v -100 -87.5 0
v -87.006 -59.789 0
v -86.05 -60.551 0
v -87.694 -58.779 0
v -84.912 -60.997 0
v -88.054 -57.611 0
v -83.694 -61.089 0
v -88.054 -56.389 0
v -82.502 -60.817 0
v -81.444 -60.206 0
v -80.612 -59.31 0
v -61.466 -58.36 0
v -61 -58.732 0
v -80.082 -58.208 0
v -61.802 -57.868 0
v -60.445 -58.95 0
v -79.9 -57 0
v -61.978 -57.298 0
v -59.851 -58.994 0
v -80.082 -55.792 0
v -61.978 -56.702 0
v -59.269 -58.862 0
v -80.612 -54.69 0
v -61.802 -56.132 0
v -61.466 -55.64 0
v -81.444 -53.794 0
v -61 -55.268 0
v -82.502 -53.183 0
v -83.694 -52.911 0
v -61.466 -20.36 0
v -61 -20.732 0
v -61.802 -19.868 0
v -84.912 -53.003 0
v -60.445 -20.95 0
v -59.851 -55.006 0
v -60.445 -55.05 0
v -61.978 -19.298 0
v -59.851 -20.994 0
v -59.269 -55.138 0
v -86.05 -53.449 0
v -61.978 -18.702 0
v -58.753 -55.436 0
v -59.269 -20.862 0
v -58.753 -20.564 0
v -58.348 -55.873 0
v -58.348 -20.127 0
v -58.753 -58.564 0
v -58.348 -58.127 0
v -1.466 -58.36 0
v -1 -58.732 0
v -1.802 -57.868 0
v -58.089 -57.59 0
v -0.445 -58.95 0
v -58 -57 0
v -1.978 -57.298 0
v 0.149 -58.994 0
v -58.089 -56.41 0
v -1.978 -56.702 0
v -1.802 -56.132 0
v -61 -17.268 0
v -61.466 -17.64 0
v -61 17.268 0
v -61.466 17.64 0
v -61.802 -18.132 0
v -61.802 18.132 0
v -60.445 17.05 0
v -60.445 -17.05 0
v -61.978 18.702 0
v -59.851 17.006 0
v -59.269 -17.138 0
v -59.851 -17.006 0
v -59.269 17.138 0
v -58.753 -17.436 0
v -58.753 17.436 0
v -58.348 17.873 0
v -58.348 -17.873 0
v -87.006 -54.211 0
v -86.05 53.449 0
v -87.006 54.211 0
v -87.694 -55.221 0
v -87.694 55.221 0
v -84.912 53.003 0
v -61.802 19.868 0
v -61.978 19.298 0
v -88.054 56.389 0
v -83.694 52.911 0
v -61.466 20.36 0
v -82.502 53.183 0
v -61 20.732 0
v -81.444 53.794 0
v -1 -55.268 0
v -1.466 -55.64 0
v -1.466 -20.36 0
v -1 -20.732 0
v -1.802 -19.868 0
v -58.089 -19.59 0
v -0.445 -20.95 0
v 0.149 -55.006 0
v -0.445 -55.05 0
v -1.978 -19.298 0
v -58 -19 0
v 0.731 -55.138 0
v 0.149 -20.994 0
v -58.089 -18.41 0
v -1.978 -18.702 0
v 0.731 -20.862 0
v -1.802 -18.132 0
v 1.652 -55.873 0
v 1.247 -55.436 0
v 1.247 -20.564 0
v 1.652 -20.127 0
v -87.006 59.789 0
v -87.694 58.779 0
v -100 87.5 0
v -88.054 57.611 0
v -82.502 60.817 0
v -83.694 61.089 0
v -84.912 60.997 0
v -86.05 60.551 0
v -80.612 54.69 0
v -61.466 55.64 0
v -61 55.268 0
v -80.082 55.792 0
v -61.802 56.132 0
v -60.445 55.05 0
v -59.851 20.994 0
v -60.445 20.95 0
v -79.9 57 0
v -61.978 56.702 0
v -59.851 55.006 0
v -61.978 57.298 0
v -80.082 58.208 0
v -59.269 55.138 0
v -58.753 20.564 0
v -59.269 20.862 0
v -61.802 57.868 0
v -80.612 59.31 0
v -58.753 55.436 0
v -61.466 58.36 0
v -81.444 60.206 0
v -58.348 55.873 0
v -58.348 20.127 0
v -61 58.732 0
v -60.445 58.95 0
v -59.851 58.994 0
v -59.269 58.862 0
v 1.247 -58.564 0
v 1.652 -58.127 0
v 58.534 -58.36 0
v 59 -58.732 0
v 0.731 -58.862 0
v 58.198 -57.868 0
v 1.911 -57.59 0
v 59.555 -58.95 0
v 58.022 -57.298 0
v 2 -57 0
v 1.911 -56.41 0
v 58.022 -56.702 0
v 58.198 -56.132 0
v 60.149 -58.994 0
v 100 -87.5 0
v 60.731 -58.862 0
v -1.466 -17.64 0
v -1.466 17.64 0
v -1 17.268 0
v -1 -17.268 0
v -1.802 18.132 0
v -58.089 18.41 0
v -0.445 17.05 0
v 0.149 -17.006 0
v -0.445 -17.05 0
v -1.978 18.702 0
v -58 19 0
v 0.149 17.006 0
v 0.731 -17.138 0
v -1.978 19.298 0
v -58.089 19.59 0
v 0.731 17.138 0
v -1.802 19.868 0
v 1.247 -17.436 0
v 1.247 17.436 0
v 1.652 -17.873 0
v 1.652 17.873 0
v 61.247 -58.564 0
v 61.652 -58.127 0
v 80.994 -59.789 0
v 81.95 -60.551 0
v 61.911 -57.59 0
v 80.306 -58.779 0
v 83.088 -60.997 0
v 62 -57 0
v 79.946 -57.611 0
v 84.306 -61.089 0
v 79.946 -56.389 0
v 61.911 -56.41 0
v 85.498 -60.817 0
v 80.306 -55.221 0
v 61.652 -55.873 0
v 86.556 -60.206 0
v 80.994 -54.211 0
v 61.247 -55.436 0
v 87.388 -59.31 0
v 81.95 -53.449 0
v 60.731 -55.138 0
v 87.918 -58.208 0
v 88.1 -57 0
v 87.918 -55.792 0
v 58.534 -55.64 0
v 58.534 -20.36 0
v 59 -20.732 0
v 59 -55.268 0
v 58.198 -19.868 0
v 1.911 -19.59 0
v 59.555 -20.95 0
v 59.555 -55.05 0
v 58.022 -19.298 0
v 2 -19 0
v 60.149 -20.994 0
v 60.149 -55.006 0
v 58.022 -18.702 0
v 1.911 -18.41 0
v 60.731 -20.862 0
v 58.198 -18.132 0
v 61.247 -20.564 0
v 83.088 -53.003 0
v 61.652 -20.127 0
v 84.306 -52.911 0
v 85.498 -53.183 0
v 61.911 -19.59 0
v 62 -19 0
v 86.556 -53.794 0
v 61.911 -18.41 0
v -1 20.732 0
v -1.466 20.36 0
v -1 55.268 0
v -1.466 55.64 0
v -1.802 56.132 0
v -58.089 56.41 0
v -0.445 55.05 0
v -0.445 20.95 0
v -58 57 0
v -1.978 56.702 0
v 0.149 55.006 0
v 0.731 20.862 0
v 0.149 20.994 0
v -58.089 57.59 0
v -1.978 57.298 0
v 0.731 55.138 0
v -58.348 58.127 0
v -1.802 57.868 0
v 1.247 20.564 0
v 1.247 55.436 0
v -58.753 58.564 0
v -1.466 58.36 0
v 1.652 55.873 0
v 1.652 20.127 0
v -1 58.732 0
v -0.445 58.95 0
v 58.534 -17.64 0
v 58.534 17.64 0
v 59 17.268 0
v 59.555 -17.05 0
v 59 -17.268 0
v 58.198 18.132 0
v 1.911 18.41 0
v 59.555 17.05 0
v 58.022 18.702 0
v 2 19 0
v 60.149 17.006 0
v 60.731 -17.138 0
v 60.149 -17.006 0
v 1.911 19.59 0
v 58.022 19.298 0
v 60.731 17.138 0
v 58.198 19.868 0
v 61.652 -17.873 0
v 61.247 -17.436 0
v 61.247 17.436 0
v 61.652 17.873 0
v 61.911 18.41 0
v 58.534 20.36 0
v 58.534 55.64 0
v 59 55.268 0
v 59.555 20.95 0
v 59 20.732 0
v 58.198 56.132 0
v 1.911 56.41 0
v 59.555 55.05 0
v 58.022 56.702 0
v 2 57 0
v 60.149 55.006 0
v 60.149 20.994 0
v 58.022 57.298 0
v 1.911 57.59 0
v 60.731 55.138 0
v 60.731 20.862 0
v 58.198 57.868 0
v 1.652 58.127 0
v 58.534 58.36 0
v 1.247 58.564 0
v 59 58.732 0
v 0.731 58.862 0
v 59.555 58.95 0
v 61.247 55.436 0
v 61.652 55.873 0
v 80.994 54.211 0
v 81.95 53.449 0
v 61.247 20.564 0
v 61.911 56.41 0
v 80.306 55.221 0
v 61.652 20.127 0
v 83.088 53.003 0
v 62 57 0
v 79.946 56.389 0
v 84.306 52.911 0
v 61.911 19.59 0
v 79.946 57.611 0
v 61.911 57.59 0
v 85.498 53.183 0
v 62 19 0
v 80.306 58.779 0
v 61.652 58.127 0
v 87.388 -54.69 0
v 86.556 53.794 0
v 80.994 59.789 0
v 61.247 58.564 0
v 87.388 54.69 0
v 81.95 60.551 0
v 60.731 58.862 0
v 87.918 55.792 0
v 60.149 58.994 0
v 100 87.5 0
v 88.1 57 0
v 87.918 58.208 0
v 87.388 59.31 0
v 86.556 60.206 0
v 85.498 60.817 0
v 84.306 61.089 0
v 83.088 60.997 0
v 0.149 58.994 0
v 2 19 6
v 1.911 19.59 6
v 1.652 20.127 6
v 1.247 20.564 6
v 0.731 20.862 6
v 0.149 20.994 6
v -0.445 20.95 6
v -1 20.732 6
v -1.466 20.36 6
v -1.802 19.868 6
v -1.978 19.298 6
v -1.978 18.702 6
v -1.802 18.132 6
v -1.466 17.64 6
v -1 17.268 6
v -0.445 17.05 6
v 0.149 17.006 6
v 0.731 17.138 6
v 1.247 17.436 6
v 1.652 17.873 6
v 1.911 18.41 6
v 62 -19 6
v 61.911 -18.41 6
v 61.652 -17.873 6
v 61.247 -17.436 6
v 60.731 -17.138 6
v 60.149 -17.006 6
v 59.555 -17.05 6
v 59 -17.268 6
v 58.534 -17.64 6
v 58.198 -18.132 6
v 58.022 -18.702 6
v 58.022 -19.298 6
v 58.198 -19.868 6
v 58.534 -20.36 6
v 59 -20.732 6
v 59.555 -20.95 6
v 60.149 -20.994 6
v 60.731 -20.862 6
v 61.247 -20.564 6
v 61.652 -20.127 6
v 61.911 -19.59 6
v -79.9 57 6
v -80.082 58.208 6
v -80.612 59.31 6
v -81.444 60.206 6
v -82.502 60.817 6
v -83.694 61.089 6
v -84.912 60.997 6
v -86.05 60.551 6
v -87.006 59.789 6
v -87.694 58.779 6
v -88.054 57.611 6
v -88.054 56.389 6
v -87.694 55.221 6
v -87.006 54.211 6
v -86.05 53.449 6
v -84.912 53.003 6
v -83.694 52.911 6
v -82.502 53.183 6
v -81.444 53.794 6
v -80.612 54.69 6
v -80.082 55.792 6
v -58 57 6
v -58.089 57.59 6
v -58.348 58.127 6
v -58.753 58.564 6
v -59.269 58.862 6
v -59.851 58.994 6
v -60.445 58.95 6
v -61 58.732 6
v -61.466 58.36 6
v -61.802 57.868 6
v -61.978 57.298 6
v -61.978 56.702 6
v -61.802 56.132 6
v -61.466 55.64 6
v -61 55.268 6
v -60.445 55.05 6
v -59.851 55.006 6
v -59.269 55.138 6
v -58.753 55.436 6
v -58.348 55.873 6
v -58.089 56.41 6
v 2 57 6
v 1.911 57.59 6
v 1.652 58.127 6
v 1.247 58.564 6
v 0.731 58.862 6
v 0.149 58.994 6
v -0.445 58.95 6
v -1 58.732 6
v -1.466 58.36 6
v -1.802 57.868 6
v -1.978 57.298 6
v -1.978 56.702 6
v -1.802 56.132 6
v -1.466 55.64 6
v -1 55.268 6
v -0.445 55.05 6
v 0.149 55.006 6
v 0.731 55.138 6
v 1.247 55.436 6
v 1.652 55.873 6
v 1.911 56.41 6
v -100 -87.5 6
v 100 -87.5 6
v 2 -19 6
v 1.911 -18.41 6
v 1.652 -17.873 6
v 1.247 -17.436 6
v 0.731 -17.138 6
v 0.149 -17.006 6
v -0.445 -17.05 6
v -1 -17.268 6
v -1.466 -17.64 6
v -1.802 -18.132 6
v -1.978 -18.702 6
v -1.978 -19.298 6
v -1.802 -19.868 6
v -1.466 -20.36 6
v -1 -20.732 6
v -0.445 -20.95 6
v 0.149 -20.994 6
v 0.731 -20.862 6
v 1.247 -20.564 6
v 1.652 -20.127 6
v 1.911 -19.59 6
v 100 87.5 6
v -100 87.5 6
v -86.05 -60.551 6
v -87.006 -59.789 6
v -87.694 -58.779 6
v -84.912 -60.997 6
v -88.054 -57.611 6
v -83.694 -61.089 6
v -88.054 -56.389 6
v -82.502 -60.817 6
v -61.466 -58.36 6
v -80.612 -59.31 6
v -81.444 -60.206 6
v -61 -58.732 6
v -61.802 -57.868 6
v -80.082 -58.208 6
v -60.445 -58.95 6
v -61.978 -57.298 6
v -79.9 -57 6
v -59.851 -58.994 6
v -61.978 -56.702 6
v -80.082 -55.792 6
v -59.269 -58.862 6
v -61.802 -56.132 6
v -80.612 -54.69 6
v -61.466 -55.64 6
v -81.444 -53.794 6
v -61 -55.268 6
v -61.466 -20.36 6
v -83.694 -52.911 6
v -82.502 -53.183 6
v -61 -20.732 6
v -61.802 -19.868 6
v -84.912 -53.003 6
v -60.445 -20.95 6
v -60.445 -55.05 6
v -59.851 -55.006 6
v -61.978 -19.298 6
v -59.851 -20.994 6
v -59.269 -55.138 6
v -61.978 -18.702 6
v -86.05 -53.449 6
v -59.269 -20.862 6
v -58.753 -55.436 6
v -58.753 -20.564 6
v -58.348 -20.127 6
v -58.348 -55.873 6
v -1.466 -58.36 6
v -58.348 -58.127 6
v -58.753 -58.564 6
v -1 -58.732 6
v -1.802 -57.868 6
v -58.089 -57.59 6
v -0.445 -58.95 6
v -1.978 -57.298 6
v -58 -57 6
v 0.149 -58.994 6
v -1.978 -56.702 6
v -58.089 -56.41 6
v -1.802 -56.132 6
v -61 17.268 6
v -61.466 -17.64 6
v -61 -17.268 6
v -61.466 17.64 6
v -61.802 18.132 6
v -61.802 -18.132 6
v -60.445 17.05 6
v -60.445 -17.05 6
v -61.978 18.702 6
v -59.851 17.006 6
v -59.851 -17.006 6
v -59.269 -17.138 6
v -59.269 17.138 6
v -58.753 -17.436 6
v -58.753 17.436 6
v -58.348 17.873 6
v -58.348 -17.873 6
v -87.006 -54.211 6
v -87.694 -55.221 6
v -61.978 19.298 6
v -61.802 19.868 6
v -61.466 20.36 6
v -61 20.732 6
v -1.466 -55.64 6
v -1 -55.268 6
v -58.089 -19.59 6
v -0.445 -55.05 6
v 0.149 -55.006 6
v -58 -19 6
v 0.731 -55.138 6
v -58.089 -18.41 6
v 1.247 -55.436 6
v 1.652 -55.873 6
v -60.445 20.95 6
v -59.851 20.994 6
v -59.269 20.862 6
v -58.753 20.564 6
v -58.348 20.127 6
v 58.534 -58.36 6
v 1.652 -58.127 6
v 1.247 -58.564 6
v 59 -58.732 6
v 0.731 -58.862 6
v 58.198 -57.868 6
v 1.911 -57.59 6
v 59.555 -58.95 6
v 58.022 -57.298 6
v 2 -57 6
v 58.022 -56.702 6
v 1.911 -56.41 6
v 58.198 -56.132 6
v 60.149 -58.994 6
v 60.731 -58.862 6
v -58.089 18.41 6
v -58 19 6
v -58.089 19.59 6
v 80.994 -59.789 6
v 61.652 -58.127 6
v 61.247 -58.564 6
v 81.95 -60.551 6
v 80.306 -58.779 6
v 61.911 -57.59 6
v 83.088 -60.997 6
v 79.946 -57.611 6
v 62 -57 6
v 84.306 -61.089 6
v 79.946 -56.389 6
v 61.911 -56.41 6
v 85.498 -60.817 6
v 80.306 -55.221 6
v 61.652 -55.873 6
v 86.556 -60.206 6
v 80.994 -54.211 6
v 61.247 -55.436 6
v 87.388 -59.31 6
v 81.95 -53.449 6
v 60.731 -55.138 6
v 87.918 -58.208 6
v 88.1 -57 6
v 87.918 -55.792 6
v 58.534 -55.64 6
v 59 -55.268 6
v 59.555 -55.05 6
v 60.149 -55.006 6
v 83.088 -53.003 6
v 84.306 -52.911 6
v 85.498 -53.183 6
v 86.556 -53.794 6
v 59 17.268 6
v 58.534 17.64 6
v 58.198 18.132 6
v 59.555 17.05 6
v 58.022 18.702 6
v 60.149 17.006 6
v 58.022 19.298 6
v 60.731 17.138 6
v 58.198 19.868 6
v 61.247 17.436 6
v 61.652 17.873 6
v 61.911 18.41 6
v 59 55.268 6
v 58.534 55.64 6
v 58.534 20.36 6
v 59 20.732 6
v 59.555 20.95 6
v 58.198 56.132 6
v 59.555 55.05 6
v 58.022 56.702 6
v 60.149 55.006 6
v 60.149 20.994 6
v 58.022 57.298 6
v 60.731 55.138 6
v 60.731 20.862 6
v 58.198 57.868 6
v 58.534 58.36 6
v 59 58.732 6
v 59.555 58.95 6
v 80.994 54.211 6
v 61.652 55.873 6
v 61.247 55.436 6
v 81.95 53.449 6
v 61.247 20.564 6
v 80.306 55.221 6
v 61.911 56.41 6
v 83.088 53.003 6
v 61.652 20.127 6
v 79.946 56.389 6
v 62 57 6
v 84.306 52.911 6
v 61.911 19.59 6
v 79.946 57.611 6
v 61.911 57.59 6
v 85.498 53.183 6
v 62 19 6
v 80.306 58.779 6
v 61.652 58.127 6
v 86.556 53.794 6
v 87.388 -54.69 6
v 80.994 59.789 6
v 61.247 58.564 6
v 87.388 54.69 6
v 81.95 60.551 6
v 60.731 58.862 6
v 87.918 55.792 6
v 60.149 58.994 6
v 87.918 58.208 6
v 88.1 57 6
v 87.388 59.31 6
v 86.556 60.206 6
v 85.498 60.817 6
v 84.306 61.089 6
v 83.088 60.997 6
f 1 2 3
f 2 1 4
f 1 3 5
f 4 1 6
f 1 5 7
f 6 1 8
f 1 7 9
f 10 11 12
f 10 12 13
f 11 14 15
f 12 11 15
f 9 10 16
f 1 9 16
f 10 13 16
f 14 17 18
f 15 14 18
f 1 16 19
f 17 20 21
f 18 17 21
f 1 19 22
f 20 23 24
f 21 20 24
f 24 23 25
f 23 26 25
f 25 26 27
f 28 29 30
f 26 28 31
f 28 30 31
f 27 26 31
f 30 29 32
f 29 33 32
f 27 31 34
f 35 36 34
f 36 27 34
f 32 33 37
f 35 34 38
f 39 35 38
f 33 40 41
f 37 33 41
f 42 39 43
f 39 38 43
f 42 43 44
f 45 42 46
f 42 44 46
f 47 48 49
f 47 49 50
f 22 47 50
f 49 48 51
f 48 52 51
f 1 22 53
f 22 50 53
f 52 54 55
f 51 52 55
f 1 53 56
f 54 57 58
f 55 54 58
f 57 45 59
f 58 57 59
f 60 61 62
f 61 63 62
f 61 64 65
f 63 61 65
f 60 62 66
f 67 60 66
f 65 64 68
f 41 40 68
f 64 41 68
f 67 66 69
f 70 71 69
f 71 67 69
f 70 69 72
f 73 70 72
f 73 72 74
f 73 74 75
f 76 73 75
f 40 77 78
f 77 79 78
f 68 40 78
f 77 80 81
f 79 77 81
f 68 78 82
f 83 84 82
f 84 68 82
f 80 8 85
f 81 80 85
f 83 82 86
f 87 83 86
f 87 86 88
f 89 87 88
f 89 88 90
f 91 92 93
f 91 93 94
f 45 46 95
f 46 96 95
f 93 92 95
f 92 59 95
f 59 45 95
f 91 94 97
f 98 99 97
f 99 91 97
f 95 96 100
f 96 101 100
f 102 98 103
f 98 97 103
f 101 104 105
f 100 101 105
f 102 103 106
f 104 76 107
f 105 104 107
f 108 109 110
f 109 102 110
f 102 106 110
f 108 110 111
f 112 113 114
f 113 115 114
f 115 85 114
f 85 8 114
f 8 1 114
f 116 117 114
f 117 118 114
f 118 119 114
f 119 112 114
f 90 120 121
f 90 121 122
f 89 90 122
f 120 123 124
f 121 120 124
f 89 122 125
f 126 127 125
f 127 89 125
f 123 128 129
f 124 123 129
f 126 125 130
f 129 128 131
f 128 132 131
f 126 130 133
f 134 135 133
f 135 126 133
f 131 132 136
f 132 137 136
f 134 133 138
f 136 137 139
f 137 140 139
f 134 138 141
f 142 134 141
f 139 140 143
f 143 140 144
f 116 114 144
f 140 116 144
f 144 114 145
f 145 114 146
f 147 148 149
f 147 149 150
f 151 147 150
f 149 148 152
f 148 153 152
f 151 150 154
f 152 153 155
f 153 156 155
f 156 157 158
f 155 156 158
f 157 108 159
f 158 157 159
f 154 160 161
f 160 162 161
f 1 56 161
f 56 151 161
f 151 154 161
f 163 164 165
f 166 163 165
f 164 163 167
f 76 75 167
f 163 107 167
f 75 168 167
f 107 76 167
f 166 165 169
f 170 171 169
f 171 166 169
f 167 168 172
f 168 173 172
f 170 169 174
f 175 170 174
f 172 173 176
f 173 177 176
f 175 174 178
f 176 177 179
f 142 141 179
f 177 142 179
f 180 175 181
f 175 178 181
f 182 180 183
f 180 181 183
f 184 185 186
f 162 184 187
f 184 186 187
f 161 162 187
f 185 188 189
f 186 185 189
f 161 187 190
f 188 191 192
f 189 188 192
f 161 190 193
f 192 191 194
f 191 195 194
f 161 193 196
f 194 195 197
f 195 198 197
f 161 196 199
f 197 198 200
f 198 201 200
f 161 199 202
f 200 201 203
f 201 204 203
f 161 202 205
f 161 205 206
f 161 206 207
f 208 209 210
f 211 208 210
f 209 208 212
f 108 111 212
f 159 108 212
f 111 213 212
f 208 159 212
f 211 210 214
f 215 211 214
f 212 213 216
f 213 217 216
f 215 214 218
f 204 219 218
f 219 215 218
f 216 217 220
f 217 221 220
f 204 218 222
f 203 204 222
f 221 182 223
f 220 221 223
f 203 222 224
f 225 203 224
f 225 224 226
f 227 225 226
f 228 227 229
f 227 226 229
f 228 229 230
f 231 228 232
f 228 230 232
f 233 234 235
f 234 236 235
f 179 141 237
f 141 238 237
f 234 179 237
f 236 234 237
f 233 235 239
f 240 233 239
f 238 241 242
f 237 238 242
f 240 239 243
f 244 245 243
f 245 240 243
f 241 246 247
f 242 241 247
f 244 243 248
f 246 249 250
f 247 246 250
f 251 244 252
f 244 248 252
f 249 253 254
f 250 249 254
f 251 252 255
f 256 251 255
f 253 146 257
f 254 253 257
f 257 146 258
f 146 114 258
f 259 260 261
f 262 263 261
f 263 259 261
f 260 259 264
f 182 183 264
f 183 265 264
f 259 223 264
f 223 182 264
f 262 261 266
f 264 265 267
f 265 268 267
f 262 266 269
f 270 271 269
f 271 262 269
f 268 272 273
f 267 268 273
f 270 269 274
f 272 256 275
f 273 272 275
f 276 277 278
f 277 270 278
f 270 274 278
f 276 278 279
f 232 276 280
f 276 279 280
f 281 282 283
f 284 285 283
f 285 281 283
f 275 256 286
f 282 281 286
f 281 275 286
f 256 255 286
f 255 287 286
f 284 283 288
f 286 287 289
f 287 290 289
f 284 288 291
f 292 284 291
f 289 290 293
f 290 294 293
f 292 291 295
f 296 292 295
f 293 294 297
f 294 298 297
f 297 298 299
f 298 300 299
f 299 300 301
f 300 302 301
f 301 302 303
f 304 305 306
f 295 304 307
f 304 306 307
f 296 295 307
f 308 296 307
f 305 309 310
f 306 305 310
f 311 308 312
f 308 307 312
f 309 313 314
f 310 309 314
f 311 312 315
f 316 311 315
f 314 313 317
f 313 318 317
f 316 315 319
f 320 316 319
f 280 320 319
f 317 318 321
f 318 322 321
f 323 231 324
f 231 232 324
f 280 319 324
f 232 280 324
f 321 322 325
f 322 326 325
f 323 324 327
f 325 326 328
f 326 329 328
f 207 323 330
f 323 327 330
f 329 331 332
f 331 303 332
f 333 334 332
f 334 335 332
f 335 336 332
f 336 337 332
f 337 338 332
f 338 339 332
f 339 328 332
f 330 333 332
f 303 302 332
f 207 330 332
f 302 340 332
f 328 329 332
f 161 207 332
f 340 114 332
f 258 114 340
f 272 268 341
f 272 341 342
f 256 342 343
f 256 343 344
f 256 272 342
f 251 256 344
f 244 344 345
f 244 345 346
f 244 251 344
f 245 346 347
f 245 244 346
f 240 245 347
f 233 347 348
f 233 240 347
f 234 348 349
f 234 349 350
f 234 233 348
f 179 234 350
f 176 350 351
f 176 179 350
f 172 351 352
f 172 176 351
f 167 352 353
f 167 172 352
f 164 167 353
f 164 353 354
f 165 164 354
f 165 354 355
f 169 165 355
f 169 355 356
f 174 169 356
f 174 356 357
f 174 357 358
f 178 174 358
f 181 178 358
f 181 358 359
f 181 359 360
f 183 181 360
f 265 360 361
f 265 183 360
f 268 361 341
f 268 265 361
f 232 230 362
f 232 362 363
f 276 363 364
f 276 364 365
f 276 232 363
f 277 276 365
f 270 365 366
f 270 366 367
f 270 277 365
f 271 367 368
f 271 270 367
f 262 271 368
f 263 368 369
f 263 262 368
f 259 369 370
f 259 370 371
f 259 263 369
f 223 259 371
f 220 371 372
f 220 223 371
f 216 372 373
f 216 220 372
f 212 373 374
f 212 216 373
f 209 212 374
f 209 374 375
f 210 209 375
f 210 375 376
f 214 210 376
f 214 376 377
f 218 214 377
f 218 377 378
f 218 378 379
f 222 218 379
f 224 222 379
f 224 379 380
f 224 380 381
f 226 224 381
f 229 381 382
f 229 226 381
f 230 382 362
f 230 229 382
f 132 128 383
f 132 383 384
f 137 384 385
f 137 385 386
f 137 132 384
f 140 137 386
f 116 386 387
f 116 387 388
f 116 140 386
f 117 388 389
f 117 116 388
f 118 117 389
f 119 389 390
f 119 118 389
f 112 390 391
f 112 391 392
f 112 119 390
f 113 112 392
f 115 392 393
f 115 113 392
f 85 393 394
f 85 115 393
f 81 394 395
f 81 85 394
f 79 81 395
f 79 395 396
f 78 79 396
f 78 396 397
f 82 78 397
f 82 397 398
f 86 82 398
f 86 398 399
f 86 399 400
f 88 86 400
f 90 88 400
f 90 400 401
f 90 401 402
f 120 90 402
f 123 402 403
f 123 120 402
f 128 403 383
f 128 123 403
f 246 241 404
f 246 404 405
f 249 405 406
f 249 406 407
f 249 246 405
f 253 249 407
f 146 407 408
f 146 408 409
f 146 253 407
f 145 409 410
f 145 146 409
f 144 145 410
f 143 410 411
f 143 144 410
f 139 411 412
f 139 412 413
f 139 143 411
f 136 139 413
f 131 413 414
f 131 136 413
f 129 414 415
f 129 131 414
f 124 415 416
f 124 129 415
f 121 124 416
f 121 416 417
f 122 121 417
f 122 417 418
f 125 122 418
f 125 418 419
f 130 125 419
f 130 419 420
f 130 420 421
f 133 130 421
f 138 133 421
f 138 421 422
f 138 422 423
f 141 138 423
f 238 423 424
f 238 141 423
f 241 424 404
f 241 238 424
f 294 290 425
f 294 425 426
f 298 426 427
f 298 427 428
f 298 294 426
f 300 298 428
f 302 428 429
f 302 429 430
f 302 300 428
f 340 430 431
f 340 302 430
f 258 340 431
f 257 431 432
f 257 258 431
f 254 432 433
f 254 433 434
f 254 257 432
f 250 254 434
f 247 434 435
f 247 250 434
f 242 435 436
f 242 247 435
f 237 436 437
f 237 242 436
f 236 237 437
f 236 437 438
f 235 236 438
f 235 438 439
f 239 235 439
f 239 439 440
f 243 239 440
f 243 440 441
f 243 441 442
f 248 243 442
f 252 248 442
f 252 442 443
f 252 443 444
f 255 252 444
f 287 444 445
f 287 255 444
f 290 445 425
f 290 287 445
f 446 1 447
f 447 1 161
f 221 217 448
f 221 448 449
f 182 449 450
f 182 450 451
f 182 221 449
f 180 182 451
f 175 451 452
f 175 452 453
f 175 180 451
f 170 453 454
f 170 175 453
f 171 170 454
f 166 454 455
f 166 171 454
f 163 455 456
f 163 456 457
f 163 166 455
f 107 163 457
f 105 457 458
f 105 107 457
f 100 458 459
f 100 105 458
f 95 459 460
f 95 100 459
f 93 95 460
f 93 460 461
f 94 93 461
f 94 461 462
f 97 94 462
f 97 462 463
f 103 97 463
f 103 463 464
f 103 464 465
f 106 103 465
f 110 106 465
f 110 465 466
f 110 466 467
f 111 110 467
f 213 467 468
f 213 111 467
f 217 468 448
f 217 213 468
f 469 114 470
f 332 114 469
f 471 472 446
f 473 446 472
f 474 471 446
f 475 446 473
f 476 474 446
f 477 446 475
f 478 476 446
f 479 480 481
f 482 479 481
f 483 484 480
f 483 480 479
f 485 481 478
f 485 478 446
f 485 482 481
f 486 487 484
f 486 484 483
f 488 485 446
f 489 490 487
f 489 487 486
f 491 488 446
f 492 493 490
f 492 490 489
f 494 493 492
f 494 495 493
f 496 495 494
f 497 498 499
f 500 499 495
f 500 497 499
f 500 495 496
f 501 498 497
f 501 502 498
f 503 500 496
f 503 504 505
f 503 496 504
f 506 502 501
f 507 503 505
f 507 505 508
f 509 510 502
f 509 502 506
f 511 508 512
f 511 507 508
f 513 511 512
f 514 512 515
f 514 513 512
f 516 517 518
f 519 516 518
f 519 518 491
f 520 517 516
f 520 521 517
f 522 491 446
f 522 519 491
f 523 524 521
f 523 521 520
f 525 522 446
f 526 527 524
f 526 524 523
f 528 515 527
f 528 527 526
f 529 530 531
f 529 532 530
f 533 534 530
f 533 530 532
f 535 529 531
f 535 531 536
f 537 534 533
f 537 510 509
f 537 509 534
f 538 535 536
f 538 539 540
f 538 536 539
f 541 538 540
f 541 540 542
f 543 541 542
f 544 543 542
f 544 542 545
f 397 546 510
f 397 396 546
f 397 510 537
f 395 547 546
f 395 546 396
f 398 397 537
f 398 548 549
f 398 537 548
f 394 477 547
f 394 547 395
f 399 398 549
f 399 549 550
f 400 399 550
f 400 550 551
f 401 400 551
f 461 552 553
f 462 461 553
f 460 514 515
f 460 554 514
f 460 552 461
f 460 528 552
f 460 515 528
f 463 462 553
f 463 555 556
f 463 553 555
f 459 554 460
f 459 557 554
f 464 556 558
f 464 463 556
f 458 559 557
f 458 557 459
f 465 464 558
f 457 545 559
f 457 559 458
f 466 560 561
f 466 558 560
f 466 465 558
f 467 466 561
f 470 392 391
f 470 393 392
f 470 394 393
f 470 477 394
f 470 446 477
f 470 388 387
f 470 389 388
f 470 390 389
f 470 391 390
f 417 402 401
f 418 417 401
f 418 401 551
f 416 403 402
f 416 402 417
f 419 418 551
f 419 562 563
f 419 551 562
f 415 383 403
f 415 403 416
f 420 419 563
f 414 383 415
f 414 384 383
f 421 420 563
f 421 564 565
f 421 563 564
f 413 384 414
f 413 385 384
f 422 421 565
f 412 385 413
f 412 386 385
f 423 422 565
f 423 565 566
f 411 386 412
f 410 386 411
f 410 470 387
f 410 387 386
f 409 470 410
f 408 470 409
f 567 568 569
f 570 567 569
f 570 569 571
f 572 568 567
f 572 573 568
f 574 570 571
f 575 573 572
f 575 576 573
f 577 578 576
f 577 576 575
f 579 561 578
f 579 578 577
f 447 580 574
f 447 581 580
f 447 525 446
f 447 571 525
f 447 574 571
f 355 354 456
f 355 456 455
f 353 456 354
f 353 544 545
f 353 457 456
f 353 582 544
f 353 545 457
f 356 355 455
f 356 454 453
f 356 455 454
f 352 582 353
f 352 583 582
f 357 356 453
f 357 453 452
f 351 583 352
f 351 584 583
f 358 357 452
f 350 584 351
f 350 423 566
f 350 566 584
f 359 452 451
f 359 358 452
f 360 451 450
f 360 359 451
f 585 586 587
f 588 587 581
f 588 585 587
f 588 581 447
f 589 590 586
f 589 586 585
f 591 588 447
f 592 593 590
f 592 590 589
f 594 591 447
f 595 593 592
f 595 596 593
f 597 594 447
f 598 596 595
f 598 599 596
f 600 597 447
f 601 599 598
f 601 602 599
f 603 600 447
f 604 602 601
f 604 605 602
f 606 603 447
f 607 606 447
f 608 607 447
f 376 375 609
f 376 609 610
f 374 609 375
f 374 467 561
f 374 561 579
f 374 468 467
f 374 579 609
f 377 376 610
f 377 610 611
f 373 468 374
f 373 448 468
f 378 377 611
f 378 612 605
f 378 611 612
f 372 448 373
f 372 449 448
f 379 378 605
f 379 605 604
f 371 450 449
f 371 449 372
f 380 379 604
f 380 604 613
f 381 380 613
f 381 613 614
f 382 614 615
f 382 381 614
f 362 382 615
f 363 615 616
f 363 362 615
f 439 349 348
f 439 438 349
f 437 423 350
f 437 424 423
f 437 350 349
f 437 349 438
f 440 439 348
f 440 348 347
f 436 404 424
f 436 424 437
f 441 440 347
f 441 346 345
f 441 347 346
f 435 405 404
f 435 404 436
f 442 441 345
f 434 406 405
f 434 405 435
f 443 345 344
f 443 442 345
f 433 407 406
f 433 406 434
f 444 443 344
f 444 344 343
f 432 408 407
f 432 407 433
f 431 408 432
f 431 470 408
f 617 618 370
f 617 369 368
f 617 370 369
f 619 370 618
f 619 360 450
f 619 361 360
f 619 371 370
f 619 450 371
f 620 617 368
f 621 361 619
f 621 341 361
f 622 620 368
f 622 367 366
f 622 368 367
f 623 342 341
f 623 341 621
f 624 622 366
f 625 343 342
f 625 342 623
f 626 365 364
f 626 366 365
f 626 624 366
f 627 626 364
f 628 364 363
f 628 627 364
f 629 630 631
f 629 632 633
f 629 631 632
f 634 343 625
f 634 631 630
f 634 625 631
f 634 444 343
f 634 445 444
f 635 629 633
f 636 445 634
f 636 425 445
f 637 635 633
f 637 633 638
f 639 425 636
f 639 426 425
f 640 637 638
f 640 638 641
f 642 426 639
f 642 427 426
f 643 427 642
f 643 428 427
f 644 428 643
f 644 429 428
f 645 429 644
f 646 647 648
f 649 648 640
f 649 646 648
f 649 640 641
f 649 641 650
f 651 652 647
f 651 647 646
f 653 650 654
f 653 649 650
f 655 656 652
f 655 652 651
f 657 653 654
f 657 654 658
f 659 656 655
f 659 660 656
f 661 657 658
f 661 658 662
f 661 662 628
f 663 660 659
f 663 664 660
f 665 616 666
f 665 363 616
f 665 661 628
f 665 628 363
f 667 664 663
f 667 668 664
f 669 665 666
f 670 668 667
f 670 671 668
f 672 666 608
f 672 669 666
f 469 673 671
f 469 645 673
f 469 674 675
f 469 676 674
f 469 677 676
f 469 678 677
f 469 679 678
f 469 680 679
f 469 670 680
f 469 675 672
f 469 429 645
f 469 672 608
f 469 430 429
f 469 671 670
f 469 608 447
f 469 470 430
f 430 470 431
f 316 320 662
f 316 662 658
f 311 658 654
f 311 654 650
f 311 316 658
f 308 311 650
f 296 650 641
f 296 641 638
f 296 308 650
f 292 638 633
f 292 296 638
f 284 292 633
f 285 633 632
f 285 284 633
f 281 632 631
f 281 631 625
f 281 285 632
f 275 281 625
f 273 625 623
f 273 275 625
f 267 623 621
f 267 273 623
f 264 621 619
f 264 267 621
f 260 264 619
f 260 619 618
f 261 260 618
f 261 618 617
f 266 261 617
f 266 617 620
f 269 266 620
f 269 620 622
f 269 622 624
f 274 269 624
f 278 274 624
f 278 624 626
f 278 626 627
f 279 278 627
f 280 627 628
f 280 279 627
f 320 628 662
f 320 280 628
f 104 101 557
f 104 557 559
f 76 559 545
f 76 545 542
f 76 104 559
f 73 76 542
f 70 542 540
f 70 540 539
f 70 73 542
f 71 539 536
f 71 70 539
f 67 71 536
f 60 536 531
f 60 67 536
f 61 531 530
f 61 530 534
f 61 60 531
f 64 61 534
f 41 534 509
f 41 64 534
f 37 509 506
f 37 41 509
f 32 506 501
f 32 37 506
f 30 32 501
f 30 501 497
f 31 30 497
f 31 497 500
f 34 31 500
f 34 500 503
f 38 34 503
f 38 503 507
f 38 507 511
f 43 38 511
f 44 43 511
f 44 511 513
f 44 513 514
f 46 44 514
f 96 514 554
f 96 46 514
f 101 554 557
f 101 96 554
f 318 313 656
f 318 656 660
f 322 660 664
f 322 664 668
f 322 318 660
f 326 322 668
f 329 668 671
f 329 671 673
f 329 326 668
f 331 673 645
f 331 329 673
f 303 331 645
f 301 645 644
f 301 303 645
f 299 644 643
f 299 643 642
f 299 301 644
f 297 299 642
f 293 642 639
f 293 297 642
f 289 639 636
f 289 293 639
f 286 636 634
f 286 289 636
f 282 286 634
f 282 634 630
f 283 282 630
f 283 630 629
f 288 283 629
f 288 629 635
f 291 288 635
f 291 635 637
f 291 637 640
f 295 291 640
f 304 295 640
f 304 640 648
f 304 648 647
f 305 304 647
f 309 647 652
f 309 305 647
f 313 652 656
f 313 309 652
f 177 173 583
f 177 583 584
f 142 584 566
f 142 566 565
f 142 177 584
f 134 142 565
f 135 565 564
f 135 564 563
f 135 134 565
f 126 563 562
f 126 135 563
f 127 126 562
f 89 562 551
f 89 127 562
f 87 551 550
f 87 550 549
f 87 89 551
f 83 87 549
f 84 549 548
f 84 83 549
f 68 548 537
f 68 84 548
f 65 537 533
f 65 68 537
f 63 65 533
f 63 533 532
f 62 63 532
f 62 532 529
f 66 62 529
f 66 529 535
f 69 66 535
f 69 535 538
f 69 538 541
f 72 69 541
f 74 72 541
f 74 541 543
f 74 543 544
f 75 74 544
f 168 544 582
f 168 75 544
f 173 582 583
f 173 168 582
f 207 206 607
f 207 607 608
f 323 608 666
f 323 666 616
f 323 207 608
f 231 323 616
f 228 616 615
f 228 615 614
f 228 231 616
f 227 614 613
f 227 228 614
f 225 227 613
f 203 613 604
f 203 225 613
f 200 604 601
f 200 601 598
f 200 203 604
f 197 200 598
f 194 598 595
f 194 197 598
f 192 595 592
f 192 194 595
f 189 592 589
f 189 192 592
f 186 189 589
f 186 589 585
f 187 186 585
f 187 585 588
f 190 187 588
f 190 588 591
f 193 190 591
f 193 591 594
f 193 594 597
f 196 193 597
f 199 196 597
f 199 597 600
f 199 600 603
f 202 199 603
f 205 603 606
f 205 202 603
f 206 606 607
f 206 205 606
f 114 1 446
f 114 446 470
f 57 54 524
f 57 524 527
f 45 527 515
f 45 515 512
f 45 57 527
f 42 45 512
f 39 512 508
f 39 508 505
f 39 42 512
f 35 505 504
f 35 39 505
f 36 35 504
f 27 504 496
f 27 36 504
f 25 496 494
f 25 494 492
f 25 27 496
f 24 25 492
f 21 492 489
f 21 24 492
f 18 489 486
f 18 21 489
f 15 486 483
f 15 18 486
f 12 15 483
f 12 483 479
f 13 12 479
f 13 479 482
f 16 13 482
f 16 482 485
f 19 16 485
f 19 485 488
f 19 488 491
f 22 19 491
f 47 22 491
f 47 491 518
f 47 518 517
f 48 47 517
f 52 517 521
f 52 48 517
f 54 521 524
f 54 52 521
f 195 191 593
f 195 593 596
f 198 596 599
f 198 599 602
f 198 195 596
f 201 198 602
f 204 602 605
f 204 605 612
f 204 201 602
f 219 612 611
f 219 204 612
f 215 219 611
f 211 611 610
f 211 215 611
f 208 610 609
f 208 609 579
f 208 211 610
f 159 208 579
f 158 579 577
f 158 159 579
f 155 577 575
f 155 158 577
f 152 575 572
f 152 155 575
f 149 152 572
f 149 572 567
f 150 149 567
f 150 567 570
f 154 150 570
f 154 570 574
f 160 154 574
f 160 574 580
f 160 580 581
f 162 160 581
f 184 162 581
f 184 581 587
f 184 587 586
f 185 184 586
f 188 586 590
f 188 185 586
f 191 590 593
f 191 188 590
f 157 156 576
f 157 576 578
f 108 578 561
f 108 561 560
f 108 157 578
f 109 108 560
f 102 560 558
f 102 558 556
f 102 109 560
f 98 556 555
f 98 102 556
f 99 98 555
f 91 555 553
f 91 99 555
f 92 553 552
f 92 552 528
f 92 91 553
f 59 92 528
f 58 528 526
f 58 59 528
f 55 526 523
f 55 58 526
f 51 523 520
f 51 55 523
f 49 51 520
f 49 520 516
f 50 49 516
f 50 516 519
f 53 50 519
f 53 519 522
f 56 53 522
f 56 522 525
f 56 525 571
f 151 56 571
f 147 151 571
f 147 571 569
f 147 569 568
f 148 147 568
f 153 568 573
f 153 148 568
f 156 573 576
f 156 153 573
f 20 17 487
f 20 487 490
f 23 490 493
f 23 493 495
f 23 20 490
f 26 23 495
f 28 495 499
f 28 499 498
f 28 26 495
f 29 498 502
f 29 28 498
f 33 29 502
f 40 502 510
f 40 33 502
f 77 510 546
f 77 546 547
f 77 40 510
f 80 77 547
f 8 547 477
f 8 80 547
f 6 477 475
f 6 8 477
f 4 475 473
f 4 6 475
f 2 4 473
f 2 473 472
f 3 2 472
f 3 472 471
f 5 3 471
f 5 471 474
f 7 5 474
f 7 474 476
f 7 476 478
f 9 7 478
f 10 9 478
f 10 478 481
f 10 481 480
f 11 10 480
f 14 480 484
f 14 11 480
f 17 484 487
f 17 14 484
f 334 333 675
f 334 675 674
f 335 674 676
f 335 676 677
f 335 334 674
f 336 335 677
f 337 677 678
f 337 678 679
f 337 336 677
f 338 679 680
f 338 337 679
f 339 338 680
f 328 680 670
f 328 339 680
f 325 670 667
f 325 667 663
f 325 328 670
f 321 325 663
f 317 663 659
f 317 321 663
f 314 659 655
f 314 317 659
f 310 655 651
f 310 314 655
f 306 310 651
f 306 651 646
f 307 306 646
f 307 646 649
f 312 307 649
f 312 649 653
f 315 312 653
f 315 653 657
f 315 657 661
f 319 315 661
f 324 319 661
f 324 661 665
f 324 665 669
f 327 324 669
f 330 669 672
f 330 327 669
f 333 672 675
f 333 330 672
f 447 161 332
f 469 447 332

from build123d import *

# Parameters (mm, degrees)
F0_W     = 200
F0_H     = 175
F0_R     = 4.1
F0_R_2   = 2
F1_DEPTH = 6


with BuildPart() as f1:
    # F0 (on Top) → F1 (new body)
    with BuildSketch(Plane.XY):
        Rectangle(F0_W, F0_H)
        with Locations((-84, -57)):
            Circle(F0_R, mode=Mode.SUBTRACT)
        with Locations((-60, -57)):
            Circle(F0_R_2, mode=Mode.SUBTRACT)
        with Locations((-60, -19)):
            Circle(F0_R_2, mode=Mode.SUBTRACT)
        with Locations((0, -57)):
            Circle(F0_R_2, mode=Mode.SUBTRACT)
        with Locations((60, -57)):
            Circle(F0_R_2, mode=Mode.SUBTRACT)
        with Locations((84, -57)):
            Circle(F0_R, mode=Mode.SUBTRACT)
        with Locations((0, -19)):
            Circle(F0_R_2, mode=Mode.SUBTRACT)
        with Locations((60, -19)):
            Circle(F0_R_2, mode=Mode.SUBTRACT)
        with Locations((-60, 19)):
            Circle(F0_R_2, mode=Mode.SUBTRACT)
        with Locations((-84, 57)):
            Circle(F0_R, mode=Mode.SUBTRACT)
        with Locations((-60, 57)):
            Circle(F0_R_2, mode=Mode.SUBTRACT)
        with Locations((0, 19)):
            Circle(F0_R_2, mode=Mode.SUBTRACT)
        with Locations((60, 19)):
            Circle(F0_R_2, mode=Mode.SUBTRACT)
        with Locations((0, 57)):
            Circle(F0_R_2, mode=Mode.SUBTRACT)
        with Locations((60, 57)):
            Circle(F0_R_2, mode=Mode.SUBTRACT)
        with Locations((84, 57)):
            Circle(F0_R, mode=Mode.SUBTRACT)
    extrude(amount=F1_DEPTH)


solid = f1.part
